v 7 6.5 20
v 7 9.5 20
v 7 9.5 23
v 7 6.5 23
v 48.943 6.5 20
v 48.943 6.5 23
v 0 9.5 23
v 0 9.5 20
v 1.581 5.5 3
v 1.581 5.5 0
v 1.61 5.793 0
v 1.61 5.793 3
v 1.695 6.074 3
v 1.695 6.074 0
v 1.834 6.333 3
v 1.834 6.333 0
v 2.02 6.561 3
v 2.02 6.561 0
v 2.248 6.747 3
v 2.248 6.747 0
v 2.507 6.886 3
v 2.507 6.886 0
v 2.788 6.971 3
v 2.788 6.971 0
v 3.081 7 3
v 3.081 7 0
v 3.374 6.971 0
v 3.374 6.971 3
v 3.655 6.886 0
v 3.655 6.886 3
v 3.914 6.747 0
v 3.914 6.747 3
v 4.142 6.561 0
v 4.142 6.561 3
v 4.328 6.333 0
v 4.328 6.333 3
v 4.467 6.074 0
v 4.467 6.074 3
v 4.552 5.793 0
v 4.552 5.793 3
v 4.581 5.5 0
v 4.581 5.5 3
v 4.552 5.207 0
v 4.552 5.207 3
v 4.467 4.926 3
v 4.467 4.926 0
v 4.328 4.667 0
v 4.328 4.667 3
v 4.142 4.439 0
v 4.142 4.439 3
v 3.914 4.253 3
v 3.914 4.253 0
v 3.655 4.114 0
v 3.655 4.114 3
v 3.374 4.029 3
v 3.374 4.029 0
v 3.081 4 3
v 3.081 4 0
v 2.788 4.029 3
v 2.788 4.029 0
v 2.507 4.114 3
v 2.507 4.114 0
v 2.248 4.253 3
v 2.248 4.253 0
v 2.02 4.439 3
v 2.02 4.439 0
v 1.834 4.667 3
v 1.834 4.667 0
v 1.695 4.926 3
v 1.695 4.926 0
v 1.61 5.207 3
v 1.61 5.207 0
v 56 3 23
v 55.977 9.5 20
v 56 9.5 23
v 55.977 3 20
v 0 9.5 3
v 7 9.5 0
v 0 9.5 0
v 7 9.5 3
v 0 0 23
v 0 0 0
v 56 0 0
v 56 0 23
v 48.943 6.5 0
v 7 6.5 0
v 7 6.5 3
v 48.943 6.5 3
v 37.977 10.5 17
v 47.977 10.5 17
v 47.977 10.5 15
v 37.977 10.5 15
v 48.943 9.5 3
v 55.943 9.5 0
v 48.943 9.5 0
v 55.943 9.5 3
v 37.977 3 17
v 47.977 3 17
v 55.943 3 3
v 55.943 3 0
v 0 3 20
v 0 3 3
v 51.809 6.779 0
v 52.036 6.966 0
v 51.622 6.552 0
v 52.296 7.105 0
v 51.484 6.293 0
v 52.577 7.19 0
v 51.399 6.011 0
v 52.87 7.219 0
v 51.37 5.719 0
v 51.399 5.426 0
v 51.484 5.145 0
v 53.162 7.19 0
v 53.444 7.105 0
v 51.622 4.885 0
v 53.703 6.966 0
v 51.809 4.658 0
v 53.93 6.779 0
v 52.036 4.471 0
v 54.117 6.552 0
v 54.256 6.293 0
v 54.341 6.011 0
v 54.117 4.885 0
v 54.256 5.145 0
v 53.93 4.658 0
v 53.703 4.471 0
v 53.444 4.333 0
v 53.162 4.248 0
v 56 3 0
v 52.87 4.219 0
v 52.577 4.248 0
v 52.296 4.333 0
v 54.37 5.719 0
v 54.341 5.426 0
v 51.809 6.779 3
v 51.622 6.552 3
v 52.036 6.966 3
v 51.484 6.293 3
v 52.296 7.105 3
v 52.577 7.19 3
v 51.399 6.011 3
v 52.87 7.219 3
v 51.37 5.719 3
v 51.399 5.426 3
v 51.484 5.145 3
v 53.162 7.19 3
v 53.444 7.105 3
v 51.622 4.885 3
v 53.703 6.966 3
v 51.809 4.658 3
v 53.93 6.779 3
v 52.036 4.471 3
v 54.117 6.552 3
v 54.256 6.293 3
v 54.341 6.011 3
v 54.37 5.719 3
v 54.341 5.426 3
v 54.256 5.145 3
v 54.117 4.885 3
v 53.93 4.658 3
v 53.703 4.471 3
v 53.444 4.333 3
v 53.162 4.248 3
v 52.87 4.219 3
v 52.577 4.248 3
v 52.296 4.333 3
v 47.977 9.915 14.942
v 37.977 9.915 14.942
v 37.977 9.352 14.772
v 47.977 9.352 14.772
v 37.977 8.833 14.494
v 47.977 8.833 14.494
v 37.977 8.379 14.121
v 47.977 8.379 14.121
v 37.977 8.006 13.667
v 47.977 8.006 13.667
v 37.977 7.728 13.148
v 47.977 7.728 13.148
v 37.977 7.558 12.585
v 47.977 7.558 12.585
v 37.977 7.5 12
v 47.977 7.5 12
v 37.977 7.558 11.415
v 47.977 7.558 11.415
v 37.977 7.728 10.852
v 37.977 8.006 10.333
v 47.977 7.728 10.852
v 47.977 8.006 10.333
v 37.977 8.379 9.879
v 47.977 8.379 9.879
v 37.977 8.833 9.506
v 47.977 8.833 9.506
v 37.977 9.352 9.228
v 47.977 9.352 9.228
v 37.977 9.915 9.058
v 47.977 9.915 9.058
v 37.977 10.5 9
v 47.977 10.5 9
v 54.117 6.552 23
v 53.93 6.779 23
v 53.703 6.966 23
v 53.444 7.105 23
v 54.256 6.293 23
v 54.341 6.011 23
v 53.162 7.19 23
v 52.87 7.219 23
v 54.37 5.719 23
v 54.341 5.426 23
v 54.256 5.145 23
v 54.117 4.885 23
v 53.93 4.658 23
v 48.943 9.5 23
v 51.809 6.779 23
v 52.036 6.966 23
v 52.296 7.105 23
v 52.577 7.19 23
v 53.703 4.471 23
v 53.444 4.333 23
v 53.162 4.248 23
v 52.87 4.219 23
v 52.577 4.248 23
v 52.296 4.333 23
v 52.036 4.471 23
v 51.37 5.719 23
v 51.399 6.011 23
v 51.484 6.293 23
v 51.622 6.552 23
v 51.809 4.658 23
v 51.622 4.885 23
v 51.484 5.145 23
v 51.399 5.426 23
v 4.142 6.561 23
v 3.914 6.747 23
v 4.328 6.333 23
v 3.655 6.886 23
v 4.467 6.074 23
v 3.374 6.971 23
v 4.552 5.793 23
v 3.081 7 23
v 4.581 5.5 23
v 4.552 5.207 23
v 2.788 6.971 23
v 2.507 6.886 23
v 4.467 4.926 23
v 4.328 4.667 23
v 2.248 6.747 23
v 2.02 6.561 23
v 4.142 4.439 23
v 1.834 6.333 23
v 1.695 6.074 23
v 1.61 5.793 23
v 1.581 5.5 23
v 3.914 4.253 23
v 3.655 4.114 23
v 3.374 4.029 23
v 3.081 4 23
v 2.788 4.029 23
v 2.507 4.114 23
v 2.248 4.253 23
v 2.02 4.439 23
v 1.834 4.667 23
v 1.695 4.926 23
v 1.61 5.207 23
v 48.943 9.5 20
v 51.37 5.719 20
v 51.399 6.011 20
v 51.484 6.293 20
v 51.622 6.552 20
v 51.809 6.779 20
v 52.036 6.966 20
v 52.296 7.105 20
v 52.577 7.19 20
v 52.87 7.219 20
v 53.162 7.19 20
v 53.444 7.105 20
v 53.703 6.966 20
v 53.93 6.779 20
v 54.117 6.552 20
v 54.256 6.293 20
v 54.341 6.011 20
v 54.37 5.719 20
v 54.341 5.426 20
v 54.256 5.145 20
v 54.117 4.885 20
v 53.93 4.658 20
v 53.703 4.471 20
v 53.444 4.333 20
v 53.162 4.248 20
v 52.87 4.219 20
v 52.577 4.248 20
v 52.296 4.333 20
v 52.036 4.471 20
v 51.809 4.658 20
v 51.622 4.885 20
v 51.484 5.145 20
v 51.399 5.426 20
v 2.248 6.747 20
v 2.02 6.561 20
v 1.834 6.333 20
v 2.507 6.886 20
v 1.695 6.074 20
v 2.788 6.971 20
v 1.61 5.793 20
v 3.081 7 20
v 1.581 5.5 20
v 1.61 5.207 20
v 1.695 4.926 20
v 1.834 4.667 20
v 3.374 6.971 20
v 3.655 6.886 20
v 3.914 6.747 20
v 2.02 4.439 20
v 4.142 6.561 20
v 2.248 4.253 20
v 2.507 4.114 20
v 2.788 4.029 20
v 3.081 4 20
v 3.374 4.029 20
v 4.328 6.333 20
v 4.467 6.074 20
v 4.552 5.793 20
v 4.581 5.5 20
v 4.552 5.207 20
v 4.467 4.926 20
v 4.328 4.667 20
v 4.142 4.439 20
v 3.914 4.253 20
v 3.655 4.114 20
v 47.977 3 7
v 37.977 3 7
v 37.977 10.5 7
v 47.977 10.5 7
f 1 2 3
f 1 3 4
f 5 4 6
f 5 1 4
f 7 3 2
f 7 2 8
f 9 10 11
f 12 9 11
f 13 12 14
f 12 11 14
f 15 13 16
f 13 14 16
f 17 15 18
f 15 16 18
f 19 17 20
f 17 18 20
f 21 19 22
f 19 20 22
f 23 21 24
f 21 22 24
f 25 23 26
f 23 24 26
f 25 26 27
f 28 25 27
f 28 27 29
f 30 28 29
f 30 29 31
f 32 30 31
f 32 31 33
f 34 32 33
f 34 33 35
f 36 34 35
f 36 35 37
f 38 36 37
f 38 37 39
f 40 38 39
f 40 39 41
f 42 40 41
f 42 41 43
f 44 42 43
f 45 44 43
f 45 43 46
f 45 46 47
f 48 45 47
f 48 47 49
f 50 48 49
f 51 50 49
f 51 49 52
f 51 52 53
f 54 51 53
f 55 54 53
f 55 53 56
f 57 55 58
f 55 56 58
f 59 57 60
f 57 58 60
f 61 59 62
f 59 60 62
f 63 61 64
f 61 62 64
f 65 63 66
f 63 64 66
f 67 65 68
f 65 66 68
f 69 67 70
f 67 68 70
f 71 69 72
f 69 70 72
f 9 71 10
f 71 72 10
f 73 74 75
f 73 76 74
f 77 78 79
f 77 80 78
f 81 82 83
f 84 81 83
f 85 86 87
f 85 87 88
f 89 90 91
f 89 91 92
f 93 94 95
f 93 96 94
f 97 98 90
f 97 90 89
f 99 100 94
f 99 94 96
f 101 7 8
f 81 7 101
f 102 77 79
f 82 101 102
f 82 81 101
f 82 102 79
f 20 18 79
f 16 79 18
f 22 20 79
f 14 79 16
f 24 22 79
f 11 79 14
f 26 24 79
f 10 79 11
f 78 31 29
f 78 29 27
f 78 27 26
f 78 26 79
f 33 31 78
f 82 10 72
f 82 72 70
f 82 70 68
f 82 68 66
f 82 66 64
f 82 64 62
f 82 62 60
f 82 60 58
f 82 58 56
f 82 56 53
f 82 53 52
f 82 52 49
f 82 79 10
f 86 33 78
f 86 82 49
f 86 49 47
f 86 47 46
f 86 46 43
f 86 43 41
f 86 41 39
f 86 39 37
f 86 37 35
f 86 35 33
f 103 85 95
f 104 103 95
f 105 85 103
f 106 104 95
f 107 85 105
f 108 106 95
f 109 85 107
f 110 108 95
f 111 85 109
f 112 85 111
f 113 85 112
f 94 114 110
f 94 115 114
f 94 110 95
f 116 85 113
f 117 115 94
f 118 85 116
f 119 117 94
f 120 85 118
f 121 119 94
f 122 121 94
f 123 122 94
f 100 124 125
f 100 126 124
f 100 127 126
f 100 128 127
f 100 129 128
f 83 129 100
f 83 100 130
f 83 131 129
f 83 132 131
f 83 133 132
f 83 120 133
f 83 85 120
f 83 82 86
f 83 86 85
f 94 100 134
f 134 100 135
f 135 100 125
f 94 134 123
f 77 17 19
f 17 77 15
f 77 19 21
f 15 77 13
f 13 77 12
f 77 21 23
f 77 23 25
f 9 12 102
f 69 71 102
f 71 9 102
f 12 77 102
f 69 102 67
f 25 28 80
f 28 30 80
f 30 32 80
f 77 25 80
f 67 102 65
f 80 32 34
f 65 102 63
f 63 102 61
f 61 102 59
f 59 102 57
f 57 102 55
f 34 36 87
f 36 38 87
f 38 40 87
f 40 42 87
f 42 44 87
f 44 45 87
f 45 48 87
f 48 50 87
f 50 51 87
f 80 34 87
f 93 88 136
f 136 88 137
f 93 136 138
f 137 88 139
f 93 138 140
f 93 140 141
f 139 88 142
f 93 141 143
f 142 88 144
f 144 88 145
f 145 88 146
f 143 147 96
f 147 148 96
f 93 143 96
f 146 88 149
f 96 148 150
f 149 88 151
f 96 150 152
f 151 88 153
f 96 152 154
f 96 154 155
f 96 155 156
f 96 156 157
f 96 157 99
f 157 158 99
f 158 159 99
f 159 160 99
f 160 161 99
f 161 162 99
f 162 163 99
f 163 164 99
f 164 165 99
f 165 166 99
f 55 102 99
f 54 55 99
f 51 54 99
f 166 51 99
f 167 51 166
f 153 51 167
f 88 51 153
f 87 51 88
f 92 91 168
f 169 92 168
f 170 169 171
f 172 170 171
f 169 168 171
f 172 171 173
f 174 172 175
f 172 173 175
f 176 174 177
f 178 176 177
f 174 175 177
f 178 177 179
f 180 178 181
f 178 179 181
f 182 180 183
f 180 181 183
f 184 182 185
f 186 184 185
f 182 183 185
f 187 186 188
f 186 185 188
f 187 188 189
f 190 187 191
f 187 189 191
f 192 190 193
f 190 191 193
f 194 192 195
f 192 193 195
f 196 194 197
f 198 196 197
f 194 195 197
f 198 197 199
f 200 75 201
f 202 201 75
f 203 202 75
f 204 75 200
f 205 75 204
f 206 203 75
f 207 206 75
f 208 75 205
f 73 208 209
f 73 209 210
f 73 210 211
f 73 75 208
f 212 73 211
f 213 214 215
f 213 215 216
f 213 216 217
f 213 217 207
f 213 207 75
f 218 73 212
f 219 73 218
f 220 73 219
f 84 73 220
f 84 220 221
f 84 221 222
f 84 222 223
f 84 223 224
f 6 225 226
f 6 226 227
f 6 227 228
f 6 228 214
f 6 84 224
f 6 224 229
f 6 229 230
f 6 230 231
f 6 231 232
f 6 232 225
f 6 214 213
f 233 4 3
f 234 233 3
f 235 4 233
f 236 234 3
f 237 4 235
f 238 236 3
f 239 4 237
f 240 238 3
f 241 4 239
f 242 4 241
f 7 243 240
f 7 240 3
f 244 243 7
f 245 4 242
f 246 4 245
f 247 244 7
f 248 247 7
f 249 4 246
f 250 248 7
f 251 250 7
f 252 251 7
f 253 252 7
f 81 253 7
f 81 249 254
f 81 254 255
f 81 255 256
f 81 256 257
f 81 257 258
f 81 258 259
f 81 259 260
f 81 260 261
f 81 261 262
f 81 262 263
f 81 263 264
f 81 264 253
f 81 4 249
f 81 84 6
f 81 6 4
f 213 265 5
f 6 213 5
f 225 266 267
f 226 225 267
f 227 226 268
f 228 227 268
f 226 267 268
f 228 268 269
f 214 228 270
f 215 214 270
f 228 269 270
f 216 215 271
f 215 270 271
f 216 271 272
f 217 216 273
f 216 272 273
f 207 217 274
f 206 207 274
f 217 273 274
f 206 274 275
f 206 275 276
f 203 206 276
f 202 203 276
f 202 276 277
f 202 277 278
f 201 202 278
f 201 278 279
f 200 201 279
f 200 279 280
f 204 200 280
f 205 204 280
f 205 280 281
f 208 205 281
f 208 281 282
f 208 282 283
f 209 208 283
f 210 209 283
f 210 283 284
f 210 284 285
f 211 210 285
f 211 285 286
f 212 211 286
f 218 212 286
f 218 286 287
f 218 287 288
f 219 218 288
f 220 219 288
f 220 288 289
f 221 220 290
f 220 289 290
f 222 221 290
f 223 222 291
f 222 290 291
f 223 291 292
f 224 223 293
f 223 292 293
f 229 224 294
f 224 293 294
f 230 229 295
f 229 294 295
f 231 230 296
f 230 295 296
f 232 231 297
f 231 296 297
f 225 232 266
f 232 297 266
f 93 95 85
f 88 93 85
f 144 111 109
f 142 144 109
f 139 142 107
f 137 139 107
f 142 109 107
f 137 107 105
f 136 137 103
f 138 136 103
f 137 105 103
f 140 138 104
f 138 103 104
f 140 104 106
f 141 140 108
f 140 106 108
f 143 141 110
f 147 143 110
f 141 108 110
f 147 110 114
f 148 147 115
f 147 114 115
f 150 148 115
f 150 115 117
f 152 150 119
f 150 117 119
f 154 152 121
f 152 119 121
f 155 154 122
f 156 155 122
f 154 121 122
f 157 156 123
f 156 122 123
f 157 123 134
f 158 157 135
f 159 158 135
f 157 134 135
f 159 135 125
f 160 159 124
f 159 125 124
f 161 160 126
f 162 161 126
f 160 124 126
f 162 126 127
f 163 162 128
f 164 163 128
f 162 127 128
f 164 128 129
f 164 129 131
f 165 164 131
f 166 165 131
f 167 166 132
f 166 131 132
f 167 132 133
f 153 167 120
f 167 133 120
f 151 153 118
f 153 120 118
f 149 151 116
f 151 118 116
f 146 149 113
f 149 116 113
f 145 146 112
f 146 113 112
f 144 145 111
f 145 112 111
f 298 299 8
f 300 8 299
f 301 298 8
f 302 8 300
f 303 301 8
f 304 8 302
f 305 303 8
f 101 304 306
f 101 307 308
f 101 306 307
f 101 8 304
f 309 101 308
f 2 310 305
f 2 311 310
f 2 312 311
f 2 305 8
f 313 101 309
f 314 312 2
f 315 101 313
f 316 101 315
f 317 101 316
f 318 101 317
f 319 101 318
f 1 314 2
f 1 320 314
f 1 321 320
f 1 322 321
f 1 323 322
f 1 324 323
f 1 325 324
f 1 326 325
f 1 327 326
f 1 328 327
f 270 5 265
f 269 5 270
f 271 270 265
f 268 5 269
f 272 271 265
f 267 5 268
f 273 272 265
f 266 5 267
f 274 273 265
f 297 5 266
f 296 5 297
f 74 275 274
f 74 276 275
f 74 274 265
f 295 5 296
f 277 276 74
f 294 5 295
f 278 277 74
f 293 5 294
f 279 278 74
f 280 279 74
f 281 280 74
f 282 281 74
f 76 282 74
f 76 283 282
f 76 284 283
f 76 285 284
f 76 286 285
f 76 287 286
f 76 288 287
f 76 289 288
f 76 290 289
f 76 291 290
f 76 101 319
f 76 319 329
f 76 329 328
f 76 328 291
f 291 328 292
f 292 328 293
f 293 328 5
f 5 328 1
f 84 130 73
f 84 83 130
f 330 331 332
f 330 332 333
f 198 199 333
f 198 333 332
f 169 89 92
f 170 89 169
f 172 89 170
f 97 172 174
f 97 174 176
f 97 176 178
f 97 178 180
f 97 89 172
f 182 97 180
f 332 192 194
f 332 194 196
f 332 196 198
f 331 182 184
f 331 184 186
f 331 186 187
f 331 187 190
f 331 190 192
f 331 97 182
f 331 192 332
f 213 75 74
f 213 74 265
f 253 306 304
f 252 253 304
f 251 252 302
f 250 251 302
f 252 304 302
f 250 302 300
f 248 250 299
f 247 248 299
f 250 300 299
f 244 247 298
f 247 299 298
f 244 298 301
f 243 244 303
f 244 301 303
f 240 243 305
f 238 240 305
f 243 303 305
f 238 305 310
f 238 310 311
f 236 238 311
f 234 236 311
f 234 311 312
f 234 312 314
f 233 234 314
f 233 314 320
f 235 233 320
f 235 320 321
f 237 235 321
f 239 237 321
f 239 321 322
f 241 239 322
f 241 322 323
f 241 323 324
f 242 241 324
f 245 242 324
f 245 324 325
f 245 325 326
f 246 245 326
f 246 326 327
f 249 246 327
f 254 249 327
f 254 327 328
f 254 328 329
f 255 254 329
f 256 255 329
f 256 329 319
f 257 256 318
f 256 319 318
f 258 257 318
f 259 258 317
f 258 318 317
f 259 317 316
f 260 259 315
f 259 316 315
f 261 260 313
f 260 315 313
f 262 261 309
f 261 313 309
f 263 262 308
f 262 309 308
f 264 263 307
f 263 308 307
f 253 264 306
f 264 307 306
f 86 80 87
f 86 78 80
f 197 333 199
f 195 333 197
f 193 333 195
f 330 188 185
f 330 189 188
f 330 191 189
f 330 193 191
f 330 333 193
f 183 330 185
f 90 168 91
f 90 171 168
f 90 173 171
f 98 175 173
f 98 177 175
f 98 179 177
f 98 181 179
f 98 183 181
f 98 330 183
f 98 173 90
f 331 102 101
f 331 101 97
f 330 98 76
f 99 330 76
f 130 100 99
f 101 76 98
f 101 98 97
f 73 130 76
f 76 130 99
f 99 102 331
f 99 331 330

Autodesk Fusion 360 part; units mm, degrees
sketch "Sketch1" plane through (0, 0, 0) normal (0, 1, 0) x (1, 0, 0)
  line L0 (0, 0) -> (56, 0)
  line L1 (56, 0) -> (56, -23)
  line L2 (56, -23) -> (0, -23)
  line L3 (0, -23) -> (0, 0)
  dimension "d1" = 56
  dimension "d2" = 23
extrude "Extrude1" add sketch "Sketch1" along normal blind 3
sketch "Sketch2" plane through (0, 3, 0) normal (0, 1, 0) x (-1, 0, 0)
  line L0 (0, 23) -> (-56, 23)
  line L1 (-56, 23) -> (-56, 0)
  line L2 (-56, 0) -> (0, 0)
  line L3 (0, 0) -> (0, 23)
  line L4 (0, 0) -> (-55.9429, 0)
  line L5 (-55.9429, 0) -> (-55.9429, 7.5)
  line L6 (-55.9429, 7.5) -> (0, 7.5)
  line L7 (0, 7.5) -> (0, 0)
  line L8 (0, 11.5) -> (-56, 11.5)
  line L9 (-55.9429, 15.5) -> (0, 15.5)
  line L10 (0, 15.5) -> (0, 23)
  line L11 (0, 23) -> (-56, 23)
  line L12 (-55.9429, 15.5) -> (-56, 23)
  line L13 (0, 7.5) -> (-7.5, 7.5)
  line L14 (-7.5, 7.5) -> (-7.5, 4.5)
  line L15 (-55.9429, 7.5) -> (-48.4429, 7.5)
  line L16 (-48.4429, 7.5) -> (-48.4429, 4.5)
  line L17 (-7.5, 4.5) -> (-48.4429, 4.5)
  line L18 (-48.4429, 4.5) -> (-48.4429, 7.5)
  line L19 (-7.5, 18.5) -> (-48.4429, 18.5)
  line L20 (-48.4429, 15.5) -> (-48.4429, 18.5)
  line L21 (-7.5, 15.5) -> (-7.5, 18.5)
  line L22 (0, 0) -> (0, 3)
  line L23 (0, 3) -> (-56, 3)
  line L24 (0, 20) -> (-56, 20)
  dimension "d5" = 7.5
  dimension "d6" = 7.5
  dimension "d7" = 3
  dimension "d8" = 7.5
  dimension "d9" = 3
  dimension "d10" = 3
extrude "Extrude2" add sketch "Sketch2" along normal blind 6.5 contours L0 L3 L10 L11 L12 L24 | L2 L3 L4 L5 L7 L22 L23
sketch "Sketch3" plane through (0, 0, 0) normal (0, 0, -1) x (-1, 0, 0)
  line L0 (-56, 0) -> (0, 0)
  line L1 (0, 0) -> (0, 9.5)
  line L2 (0, 9.5) -> (-55.9429, 9.5)
  line L3 (-55.9429, 9.5) -> (-55.9429, 3)
  line L4 (-55.9429, 3) -> (-56, 3)
  line L5 (-56, 3) -> (-56, 0)
  line L6 (0, 0) -> (0, 9.5)
  line L7 (0, 9.5) -> (-7, 9.5)
  line L8 (-7, 9.5) -> (-7, 6.5)
  line L9 (-55.9429, 9.5) -> (-48.9429, 9.5)
  line L10 (-48.9429, 9.5) -> (-48.9429, 6.5)
  line L11 (-7, 6.5) -> (-48.9429, 6.5)
  dimension "d13" = 9.5
  dimension "d14" = 7
  dimension "d15" = 3
  dimension "d16" = 7
  dimension "d17" = 3
extrude "Extrude3" cut sketch "Sketch3" against normal blind 30 contours L2 L8 L10 L11
sketch "Sketch4" plane through (0, 0, 0) normal (0, 0, -1) x (-1, 0, 0)
  line L0 (-7, 9.5) -> (-7, 6.5)
  line L1 (-7, 6.5) -> (-48.9429, 6.5)
  line L2 (-48.9429, 6.5) -> (-48.9429, 9.5)
  line L3 (-48.9429, 9.5) -> (-55.9429, 9.5)
  line L4 (-55.9429, 9.5) -> (-55.9429, 3)
  line L5 (-55.9429, 3) -> (-56, 3)
  line L6 (-56, 3) -> (-56, 0)
  line L7 (-56, 0) -> (0, 0)
  line L8 (0, 0) -> (0, 9.5)
  line L9 (0, 9.5) -> (-7, 9.5)
  line L10 (0, 0) -> (-3.081, 0)
  line L11 (-3.081, 0) -> (-3.081, 9.5)
  line L12 (0, 0) -> (0, 2.916)
  line L13 (0, 2.916) -> (-5.2666, 2.916)
  line L14 (-28, 0) -> (-27.9715, 6.5)
  line L15 (-2.393, 9.5) -> (-2.393, 6.584)
  line L16 (-2.393, 6.584) -> (-5.7836, 6.584)
  line L17 (-3.081, 0) -> (-3.081, 4.5)
  line L18 (-3.081, 0) -> (-3.081, 5.5)
  circle A0 centre (-3.081, 5.5) radius 1.5
  circle A1 centre (-52.8697, 5.7187) radius 1.5
  dimension "d20" = 3.081
  dimension "d21" = 2.916
  dimension "d23" = 2.916
  dimension "d25" = 4.5
  dimension "d26" = 5.5
  dimension "d27" = 3
extrude "Extrude4" cut sketch "Sketch4" against normal blind 30 contours L11 L15 L16 A0 | L11 L16 A0 | L11 L15 L16 L17 L18 A0 | L11 L16 L17 L18 A0 | A1
sketch "Sketch6" plane through (0, 3, 0) normal (0, 1, 0) x (-1, 0, 0)
  line L0 (-55.9772, 20) -> (-56, 23)
  line L1 (-56, 23) -> (-56, 0)
  line L2 (-56, 0) -> (-55.9429, 0)
  line L3 (-55.9429, 0) -> (-55.9429, 3)
  line L4 (-55.9429, 3) -> (0, 3)
  line L5 (0, 3) -> (0, 20)
  line L6 (0, 20) -> (-55.9772, 20)
  line L7 (-55.9772, 20) -> (-47.9772, 20)
  line L8 (-47.9772, 20) -> (-37.9772, 20)
  line L9 (-37.9772, 20) -> (-37.9772, 10)
  line L10 (-37.9772, 10) -> (-47.9772, 10)
  line L11 (-47.9772, 10) -> (-47.9772, 20)
  line L12 (-37.9772, 20) -> (-37.9772, 19.4199)
  line L13 (-37.9772, 3) -> (-37.9772, 20)
  line L14 (-37.9772, 20) -> (-37.9772, 11.5)
  line L15 (-37.9772, 17) -> (-37.9772, 8.5)
  line L16 (-37.9772, 17) -> (-37.9772, 7)
  line L17 (-37.9772, 7) -> (-47.9772, 7)
  line L18 (-47.9772, 7) -> (-47.9772, 17)
  line L19 (-47.9772, 17) -> (-37.9772, 17)
  dimension "d30" = 8
  dimension "d31" = 10
  dimension "d32" = 10
  dimension "d38" = 10
  dimension "d39" = 10
extrude "Extrude5" add sketch "Sketch6" along normal blind 7.5 contours L9 L10 L11 L13 L14 L15 L16 L18 L19 | L10 L13 L15 L16 L17 L18
sketch "Sketch7" plane through (47.9772, 0, 0) normal (1, 0, 0) x (0, 0, -1)
  line L0 (-17, 3) -> (-7, 3)
  line L1 (-7, 10.5) -> (-17, 10.5)
  circle A0 centre (-12, 10.5) radius 3
  line L2 (-7, 3) -> (-7, 10.5)
  line L3 (-17, 10.5) -> (-17, 3)
  dimension "d35" = 6
extrude "Extrude6" cut sketch "Sketch7" against normal blind 10 contours L1 A0 picked at (-12.5, 9.634)
